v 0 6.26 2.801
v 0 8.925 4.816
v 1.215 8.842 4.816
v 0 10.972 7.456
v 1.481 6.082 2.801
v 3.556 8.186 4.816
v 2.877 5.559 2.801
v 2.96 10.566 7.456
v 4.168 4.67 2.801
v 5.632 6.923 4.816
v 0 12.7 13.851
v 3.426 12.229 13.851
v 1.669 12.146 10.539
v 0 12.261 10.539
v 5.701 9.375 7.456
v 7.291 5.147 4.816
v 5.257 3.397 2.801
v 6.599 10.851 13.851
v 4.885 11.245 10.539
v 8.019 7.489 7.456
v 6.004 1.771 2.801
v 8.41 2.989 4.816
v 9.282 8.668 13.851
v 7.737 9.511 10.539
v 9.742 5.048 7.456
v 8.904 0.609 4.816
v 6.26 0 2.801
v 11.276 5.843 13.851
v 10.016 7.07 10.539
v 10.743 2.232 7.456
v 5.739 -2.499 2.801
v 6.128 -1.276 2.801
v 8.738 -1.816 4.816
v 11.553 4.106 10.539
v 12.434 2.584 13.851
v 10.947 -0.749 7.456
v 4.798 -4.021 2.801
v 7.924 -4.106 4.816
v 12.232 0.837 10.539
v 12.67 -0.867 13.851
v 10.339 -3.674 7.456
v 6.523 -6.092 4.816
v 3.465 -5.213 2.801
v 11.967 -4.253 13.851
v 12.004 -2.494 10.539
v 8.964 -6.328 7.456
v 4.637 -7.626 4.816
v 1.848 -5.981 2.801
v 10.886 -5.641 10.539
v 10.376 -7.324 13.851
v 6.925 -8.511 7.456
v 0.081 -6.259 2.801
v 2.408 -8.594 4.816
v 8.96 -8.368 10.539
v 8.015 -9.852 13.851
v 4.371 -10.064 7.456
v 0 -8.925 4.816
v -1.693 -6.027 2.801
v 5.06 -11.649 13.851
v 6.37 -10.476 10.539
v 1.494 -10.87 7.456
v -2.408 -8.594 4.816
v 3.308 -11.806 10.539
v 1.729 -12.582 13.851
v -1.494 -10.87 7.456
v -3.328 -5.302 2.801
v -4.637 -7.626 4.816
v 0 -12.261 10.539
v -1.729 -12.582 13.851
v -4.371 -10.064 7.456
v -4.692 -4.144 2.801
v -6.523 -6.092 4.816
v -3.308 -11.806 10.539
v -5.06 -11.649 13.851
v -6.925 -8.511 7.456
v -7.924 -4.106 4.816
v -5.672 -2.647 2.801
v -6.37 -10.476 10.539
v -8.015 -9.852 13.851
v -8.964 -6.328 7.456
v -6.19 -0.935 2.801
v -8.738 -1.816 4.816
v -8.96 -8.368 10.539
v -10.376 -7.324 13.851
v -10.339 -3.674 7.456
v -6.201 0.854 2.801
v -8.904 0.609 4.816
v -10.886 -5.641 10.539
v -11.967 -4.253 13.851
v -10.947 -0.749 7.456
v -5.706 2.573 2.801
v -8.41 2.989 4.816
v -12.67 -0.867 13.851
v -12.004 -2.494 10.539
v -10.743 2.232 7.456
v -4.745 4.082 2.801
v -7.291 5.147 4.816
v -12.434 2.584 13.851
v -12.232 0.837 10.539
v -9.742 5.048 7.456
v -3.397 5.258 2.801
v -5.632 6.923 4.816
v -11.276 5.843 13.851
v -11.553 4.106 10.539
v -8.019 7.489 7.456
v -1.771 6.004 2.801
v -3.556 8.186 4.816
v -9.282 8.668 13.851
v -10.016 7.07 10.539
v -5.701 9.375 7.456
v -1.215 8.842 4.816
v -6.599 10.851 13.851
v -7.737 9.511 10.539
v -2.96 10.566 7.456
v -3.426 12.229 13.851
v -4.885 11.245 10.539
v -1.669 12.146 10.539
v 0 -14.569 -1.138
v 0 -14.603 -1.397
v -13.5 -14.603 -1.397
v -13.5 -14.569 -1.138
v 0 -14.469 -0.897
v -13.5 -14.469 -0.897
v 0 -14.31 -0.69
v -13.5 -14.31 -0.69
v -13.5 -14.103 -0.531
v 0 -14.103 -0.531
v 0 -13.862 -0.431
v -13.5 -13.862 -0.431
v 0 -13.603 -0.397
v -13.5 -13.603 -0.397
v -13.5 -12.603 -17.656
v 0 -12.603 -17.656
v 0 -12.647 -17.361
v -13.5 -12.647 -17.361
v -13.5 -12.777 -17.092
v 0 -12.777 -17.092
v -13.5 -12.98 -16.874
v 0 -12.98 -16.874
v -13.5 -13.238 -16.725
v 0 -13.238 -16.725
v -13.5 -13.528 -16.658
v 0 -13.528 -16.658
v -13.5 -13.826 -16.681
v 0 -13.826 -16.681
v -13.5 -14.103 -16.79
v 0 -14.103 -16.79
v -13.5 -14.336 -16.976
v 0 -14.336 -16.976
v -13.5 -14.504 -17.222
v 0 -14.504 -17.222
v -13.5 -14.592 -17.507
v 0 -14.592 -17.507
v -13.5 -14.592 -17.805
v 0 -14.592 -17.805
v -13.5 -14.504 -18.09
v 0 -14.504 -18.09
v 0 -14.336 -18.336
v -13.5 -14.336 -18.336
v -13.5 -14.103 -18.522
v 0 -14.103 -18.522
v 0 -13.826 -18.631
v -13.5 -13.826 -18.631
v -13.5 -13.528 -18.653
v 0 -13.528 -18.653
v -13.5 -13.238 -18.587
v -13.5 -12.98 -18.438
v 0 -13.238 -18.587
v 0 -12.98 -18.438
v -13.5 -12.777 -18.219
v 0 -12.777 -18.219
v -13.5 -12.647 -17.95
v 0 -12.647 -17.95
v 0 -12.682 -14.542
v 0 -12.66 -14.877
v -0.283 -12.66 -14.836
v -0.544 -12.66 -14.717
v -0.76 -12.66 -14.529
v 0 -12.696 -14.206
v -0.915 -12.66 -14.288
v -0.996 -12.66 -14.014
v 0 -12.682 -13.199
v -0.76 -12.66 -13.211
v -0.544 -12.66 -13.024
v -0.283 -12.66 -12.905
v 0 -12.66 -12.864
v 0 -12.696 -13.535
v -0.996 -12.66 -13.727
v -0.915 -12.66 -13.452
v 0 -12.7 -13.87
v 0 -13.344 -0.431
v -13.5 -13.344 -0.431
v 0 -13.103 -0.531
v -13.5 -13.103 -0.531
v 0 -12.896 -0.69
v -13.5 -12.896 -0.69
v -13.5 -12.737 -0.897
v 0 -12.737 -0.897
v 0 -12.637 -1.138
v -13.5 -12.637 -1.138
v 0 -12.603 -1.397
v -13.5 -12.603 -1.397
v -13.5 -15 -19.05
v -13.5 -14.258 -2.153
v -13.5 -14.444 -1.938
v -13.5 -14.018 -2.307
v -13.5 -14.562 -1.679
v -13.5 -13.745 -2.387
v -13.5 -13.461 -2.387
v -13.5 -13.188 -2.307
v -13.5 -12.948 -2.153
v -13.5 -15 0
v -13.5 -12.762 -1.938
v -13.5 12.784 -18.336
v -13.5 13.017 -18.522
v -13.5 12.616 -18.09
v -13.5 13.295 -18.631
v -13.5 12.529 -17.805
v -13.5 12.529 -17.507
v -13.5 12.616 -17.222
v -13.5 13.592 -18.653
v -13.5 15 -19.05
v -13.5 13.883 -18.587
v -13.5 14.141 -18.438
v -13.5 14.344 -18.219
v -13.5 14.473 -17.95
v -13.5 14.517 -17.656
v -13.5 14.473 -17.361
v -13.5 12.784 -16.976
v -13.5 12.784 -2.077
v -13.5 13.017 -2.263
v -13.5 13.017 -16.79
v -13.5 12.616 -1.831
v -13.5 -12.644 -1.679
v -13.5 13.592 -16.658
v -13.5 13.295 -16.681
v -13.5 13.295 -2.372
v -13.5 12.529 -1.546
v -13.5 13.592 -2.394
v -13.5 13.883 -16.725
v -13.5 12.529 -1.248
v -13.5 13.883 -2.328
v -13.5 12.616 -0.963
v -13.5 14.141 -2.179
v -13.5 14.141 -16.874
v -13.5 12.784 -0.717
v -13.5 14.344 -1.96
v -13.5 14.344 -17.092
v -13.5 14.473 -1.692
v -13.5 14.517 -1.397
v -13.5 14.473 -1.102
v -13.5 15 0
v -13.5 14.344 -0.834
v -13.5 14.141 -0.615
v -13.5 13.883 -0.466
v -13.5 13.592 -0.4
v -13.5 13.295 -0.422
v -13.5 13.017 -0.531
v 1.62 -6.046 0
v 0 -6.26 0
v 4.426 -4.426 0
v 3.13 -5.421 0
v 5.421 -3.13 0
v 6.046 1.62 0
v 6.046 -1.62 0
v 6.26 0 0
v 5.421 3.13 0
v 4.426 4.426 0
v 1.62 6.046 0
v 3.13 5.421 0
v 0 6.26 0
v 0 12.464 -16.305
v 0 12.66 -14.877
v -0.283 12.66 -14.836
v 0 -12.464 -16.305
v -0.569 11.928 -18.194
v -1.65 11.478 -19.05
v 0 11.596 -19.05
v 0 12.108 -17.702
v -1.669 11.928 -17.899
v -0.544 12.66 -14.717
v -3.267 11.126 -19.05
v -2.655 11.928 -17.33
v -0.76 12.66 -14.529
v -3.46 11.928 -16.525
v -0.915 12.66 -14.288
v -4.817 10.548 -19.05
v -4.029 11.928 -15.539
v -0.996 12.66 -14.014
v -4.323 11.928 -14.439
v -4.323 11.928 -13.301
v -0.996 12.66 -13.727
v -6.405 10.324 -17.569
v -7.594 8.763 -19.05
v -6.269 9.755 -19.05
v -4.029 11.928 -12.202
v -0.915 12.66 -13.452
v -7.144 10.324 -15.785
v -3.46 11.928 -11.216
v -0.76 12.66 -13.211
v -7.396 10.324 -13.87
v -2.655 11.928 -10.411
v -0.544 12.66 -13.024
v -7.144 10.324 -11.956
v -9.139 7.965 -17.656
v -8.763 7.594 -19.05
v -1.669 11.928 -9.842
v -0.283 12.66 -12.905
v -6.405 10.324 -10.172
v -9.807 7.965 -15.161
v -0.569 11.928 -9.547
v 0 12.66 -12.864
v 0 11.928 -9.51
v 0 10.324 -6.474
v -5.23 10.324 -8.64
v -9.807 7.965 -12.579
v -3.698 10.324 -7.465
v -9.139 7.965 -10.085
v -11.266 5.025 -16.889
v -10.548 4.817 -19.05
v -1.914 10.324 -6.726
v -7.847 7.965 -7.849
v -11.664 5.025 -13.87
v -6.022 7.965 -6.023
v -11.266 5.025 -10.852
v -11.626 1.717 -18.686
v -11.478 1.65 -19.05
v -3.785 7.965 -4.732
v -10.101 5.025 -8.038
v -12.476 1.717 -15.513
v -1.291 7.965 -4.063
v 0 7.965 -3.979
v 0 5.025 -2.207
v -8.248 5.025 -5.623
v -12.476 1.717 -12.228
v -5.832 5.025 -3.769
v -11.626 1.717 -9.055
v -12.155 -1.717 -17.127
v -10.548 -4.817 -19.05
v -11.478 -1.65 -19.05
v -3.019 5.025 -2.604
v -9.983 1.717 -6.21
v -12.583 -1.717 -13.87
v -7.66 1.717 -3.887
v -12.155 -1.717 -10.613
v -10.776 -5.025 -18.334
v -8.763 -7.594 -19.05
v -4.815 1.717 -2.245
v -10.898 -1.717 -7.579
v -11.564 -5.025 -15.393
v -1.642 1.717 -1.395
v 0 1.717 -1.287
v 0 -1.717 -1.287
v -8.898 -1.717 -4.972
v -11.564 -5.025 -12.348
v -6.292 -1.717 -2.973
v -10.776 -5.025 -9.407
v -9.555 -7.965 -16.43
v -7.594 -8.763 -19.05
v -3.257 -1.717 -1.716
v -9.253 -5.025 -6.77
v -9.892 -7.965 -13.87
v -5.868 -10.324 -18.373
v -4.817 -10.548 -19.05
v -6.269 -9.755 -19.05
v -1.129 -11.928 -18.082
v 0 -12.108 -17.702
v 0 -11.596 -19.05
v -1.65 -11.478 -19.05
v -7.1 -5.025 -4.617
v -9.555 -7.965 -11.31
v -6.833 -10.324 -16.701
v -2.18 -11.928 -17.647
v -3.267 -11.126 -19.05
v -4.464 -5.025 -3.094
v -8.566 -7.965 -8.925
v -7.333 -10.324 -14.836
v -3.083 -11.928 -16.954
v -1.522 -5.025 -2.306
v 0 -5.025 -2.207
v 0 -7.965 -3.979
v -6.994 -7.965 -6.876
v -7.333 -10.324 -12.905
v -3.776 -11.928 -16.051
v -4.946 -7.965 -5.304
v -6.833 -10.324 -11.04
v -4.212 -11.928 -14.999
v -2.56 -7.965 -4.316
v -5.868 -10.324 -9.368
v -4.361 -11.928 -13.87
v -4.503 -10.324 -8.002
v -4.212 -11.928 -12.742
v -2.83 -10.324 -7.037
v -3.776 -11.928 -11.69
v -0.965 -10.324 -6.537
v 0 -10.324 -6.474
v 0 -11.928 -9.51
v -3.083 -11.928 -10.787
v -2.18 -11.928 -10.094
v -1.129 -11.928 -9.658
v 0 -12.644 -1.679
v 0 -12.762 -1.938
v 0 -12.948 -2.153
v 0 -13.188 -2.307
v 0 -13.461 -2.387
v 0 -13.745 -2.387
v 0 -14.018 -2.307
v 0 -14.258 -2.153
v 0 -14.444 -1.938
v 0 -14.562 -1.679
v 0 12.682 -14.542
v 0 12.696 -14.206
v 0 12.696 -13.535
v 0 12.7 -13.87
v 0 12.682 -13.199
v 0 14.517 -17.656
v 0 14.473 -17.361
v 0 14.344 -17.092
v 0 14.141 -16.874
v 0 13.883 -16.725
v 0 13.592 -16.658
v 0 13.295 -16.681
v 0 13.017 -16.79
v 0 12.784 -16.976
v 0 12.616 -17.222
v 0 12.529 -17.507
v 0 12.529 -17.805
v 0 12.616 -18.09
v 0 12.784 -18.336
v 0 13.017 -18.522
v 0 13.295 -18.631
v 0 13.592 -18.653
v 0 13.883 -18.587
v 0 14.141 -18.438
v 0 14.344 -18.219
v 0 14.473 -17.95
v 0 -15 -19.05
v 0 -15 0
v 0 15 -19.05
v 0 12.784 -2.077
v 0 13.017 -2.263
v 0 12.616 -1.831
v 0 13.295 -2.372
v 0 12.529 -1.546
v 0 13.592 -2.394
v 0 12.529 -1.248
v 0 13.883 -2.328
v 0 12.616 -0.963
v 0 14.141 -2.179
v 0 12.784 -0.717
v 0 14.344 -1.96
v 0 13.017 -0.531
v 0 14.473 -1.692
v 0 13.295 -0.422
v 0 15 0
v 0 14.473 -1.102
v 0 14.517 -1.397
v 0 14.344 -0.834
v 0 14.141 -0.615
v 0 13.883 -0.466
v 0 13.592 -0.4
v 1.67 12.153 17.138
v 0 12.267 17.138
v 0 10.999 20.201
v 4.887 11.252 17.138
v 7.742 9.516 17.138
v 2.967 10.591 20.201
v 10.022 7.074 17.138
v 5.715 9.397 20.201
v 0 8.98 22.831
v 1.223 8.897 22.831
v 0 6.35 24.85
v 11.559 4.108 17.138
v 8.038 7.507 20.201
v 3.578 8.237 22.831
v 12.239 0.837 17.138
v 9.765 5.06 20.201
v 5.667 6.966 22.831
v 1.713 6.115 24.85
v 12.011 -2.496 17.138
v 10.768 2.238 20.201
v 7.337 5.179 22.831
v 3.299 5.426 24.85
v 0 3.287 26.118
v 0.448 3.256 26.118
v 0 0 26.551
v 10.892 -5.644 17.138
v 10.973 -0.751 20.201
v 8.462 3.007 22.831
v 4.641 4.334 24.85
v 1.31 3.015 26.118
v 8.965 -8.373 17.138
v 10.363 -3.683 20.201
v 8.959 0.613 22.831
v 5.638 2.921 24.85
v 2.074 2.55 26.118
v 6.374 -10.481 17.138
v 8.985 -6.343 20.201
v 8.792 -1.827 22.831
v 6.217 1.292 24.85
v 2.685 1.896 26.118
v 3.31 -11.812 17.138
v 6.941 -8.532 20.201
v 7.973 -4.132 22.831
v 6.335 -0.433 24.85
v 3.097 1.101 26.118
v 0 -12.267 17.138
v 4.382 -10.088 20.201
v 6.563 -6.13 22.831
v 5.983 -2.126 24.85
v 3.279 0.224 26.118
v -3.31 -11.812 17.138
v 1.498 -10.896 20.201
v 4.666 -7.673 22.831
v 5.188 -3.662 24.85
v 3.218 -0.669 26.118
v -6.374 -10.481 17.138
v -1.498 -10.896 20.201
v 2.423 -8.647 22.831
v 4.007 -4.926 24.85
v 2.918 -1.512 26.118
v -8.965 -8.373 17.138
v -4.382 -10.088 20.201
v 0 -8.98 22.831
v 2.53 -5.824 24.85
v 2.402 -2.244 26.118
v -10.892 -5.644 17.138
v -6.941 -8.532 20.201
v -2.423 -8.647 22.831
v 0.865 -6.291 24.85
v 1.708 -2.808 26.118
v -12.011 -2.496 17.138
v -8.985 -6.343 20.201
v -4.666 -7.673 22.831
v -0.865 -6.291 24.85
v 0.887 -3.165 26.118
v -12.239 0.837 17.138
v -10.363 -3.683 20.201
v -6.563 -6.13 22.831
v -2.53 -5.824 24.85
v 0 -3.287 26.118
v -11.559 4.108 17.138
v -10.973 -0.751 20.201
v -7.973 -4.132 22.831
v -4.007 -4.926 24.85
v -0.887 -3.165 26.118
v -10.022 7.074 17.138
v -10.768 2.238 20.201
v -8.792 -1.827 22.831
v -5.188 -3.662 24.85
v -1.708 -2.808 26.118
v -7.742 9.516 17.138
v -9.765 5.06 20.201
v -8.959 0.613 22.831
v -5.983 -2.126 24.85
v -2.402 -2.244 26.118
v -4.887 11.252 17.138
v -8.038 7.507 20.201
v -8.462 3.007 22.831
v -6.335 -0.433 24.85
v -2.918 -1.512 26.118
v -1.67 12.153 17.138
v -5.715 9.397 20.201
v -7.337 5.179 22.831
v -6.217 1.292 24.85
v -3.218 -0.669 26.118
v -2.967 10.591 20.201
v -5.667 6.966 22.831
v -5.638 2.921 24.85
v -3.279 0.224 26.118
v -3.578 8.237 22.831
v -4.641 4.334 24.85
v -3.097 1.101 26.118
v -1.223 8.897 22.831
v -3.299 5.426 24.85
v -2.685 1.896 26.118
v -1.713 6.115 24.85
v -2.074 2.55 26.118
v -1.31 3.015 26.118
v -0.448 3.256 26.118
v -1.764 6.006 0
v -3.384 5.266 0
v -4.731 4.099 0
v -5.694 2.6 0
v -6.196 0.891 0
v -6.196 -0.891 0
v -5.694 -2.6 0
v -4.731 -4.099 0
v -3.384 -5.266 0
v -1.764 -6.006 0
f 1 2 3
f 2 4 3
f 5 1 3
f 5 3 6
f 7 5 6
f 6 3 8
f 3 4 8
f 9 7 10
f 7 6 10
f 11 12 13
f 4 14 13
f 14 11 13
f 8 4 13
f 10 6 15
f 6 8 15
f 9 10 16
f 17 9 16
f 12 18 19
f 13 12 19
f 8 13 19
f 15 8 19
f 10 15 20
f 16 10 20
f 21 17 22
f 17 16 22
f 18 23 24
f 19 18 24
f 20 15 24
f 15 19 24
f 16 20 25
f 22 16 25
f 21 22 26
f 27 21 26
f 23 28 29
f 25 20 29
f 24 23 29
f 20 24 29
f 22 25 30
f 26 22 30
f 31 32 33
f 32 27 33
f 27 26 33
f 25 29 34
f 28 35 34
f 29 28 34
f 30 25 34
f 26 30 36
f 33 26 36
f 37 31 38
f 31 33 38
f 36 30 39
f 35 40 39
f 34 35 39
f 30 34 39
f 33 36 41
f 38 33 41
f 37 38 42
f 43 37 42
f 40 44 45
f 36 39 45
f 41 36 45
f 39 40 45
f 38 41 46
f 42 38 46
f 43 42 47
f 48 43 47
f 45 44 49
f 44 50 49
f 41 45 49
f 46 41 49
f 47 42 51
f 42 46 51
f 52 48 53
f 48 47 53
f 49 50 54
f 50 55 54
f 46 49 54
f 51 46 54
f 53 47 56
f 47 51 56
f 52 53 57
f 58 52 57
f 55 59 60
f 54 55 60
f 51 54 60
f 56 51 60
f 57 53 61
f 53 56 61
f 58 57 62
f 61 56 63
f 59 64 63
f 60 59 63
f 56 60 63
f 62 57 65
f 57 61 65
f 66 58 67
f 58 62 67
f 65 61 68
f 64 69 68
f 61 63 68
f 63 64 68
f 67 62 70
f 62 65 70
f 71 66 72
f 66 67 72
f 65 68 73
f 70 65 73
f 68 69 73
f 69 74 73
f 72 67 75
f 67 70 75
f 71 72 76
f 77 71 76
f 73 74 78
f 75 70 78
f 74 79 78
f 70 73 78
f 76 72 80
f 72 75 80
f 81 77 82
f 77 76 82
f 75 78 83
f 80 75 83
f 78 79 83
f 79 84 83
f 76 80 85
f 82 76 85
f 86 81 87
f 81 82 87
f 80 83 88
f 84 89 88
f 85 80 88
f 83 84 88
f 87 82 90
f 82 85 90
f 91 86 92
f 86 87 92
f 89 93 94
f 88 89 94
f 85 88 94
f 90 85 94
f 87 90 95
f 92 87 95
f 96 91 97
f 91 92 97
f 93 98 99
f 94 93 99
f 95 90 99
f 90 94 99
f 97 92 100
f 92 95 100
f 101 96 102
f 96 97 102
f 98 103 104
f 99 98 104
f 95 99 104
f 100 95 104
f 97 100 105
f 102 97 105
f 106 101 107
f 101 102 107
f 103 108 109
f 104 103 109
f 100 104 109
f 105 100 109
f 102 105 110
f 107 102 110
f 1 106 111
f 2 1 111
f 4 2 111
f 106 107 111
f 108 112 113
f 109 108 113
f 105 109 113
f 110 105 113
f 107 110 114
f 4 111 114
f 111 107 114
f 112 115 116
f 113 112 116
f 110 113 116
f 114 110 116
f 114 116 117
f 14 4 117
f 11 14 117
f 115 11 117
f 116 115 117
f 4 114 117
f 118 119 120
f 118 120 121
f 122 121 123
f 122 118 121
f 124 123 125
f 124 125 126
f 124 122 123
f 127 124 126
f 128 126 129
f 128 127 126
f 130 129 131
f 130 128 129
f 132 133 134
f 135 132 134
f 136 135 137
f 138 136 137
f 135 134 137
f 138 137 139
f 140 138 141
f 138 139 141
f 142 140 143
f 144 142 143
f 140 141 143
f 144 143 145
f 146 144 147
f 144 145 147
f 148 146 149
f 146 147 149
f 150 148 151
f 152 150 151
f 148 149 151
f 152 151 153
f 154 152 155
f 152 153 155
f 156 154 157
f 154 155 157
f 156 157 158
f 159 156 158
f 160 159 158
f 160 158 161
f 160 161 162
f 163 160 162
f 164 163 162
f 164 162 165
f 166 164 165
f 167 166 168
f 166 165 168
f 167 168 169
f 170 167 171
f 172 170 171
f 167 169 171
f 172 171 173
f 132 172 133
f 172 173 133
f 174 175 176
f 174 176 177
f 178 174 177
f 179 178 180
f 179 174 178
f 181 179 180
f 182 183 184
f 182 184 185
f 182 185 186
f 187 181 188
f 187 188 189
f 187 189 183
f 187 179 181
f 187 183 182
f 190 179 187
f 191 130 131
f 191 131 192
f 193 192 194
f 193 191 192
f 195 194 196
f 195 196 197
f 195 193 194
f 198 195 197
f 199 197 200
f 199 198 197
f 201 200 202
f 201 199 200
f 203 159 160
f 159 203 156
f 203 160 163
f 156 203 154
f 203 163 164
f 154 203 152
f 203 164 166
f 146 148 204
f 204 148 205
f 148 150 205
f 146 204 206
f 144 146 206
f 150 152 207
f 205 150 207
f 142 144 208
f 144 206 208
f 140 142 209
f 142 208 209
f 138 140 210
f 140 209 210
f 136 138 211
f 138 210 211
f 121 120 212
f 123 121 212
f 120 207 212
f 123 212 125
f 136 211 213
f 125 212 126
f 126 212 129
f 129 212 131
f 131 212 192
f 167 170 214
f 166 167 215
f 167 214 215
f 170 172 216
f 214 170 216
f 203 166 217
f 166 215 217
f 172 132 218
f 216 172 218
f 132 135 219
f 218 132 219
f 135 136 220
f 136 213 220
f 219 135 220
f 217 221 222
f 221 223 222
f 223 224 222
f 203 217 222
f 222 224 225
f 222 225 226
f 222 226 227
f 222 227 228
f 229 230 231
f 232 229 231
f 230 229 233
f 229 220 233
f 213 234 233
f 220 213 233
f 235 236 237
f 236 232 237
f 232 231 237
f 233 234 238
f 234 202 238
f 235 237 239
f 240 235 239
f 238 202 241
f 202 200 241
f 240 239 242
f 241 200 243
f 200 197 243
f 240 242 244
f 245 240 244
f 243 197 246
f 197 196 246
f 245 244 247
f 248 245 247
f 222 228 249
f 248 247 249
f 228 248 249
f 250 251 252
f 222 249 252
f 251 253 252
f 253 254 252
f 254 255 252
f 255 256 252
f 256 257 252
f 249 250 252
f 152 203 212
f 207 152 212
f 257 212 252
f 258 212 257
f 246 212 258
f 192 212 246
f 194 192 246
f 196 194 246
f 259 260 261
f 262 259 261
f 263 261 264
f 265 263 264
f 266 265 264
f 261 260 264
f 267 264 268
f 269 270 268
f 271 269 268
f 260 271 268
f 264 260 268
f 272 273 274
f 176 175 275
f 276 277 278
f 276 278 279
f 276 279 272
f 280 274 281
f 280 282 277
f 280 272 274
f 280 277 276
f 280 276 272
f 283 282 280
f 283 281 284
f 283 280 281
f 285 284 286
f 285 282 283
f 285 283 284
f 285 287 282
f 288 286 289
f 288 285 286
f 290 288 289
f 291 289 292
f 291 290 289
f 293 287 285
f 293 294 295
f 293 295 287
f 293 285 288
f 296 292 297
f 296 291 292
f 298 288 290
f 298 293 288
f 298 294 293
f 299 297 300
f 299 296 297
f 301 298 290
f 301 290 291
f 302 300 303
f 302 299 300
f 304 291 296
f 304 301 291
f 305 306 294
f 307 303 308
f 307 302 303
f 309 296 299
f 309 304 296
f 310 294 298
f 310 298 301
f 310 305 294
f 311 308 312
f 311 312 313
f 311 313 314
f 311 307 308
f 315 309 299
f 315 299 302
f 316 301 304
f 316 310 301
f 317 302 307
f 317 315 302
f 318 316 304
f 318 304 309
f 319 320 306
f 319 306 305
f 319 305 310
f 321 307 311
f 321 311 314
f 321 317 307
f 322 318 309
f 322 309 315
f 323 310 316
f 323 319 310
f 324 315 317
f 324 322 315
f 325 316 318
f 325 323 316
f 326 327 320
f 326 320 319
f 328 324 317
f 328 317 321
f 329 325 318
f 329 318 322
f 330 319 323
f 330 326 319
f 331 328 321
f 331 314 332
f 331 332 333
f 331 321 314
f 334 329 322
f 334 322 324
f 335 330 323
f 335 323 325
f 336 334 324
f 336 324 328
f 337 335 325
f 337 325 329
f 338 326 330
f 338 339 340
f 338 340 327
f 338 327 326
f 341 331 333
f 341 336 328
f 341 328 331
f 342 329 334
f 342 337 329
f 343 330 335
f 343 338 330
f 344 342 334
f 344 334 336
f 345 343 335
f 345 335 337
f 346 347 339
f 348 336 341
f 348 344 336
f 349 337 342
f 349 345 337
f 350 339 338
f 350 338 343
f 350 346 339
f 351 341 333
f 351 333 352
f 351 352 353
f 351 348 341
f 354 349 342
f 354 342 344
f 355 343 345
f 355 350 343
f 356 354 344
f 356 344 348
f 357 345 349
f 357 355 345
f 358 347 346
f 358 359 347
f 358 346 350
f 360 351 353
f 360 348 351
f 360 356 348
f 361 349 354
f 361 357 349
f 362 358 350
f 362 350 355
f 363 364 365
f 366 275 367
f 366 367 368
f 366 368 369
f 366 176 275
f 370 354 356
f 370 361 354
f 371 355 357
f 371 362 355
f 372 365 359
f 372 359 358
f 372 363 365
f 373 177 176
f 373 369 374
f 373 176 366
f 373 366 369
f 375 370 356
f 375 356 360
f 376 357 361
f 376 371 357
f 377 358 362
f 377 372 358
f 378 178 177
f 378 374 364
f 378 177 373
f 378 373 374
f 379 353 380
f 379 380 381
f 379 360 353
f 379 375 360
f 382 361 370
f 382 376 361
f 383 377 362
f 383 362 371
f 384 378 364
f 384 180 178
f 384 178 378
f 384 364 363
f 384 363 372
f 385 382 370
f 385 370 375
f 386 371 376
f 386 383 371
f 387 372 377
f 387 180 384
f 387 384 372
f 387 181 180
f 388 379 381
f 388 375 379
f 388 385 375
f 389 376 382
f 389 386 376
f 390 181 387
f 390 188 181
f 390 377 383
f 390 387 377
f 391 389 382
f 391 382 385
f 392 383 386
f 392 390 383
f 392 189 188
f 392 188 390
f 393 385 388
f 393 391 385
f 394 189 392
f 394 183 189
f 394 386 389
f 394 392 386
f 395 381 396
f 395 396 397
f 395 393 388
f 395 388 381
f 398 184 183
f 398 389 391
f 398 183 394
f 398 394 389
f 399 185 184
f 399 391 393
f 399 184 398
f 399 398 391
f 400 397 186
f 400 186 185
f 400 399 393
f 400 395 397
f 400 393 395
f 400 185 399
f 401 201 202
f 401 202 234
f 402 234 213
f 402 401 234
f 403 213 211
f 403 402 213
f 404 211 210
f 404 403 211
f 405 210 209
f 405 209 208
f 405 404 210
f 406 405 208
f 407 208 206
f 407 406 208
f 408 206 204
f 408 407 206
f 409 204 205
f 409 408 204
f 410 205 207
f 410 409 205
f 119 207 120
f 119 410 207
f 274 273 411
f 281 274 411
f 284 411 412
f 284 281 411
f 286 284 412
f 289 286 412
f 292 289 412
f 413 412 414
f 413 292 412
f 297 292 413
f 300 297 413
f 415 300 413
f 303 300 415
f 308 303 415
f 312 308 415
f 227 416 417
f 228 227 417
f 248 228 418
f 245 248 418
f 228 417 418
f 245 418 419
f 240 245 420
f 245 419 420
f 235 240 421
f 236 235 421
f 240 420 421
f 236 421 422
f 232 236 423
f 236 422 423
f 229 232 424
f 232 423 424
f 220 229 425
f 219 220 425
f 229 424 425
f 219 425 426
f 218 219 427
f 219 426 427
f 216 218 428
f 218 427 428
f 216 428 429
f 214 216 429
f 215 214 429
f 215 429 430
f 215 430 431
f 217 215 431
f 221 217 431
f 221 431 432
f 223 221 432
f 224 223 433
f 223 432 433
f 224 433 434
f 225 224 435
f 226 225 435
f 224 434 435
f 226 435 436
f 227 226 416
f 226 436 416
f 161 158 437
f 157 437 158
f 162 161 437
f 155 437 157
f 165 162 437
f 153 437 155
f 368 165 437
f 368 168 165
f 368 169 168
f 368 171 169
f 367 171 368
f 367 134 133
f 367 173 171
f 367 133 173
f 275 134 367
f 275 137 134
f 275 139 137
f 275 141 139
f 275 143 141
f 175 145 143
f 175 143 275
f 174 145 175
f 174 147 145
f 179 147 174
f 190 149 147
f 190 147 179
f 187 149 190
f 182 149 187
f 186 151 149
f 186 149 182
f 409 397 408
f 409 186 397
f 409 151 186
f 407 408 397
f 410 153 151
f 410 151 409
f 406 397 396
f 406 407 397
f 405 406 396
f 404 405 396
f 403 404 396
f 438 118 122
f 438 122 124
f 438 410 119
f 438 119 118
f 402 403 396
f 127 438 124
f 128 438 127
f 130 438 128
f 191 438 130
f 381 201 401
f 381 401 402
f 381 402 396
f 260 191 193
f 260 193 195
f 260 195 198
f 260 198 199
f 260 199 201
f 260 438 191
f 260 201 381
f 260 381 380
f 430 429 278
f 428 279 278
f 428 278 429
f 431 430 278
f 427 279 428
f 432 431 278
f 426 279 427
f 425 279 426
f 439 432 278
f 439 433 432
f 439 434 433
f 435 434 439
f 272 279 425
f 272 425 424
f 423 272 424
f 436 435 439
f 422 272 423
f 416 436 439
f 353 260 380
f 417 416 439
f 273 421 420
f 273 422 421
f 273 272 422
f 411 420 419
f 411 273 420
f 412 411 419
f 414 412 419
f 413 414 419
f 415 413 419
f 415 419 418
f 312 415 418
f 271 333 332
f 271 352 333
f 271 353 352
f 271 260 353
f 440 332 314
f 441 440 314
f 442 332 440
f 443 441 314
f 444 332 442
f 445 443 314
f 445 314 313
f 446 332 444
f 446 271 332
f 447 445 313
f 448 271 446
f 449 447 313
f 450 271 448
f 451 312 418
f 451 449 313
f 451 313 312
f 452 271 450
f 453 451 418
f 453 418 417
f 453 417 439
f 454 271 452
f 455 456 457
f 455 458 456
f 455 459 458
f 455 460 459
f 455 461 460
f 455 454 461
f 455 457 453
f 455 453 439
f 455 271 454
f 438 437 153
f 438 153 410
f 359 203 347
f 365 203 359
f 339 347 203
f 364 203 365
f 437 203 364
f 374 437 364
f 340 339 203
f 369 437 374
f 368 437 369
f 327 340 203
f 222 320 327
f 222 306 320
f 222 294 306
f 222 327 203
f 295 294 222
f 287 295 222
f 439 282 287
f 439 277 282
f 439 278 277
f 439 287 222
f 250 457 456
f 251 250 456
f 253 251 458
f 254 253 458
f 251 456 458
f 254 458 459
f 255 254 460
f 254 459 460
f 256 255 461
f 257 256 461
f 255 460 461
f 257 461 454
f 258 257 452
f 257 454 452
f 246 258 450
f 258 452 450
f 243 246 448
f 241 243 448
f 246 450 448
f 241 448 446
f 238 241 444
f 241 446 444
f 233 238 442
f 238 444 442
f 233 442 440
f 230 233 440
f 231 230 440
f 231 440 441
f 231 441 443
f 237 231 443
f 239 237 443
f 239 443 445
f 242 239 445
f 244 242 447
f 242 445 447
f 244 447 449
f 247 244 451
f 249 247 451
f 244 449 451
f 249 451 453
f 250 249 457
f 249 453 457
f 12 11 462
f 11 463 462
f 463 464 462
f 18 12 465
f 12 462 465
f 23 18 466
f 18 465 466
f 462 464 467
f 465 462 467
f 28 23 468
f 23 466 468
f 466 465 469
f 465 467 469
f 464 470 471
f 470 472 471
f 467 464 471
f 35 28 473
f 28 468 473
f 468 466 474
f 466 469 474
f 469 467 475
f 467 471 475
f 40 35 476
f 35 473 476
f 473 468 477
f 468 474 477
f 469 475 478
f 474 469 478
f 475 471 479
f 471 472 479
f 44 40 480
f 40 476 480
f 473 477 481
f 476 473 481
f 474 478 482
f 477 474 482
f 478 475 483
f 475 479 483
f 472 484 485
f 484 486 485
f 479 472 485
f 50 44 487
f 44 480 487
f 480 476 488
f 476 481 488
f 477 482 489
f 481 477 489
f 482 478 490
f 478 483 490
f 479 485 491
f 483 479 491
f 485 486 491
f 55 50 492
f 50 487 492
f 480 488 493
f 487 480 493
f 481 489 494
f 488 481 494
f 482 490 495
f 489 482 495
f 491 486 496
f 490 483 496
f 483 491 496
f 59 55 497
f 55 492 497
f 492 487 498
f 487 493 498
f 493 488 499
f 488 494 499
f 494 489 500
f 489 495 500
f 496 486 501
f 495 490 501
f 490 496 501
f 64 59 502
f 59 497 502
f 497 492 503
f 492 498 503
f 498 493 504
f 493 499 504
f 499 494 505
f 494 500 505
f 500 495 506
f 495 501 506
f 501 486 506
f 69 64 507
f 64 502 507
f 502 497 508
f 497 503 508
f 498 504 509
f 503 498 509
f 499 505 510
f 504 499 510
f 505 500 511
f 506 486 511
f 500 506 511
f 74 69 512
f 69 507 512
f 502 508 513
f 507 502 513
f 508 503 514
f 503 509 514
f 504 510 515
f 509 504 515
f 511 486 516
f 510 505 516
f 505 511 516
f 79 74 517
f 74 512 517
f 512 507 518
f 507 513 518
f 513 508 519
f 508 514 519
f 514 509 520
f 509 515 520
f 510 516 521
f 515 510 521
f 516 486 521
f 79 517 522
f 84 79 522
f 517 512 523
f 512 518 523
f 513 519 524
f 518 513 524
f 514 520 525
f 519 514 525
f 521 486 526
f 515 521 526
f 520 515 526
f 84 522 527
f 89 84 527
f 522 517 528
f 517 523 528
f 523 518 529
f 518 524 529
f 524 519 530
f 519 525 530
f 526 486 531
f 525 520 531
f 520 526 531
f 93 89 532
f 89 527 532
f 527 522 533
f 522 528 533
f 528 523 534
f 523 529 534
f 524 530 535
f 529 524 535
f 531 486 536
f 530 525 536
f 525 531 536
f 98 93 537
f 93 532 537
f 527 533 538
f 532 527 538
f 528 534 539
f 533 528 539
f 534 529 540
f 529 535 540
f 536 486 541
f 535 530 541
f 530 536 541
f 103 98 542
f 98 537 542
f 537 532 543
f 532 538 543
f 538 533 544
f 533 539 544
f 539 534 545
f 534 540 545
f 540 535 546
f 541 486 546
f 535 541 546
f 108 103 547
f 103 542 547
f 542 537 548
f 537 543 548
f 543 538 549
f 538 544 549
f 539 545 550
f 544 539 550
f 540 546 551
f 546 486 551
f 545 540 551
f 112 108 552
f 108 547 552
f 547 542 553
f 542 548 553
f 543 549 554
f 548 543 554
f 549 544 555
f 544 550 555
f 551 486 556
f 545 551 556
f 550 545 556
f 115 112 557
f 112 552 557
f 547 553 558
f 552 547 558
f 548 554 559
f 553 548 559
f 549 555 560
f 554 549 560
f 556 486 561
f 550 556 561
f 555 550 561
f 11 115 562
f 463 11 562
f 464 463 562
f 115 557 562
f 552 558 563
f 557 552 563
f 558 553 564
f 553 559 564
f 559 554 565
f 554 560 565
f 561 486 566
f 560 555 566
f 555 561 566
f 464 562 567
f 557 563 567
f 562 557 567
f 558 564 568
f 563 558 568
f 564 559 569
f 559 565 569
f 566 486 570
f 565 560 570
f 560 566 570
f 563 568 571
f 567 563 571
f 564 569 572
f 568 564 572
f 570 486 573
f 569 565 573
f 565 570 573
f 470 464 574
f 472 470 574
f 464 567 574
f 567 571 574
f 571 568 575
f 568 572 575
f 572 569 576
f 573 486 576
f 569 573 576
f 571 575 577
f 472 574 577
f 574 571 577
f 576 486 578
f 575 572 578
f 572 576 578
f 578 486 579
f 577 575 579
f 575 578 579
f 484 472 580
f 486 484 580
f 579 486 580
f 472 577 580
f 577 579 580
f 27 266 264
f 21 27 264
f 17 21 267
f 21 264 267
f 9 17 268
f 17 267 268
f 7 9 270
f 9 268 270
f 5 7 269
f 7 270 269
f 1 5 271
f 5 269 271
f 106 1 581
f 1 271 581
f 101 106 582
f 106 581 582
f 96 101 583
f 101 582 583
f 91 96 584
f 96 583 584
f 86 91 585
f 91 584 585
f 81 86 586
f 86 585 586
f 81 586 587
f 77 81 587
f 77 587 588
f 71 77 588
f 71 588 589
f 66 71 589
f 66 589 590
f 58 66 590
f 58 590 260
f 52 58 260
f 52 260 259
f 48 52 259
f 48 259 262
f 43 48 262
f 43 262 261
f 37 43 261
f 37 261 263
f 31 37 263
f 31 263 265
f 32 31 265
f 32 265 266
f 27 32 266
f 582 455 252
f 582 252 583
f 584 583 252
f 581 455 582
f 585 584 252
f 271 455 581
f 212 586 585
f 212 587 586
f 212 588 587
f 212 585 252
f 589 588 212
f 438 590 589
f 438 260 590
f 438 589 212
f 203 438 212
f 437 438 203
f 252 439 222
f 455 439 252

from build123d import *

# Parameters (mm, degrees)
F2_R     = 6.2596868845
F3_DEPTH = 3.048
F4_R     = 1
F5_DEPTH = 13.5


with BuildPart() as f1:
    # F0 (on Right) → F1 (revolve)
    with BuildSketch(Plane.YZ):
        with BuildLine():
            ThreePointArc((0, 1.1509964916), (8.9802561211, 4.8707403706), (12.7, 13.8509964916))
            ThreePointArc((12.7, 13.8509964916), (8.9802561211, 22.8312526127), (0, 26.5509964916))
            Line((0, 26.5509964916), (0, 1.1509964916))
        make_face()
    revolve(axis=Axis((0, 0, 13.8509964916), (0, 0, -1)))

    # F2 (on Top) → F3 (join)
    with BuildSketch(Plane.XY):
        Circle(F2_R)
    extrude(amount=F3_DEPTH)

    # F4 (on Right) → F5 (join)
    with BuildSketch(Plane.YZ):
        with BuildLine():
            Line((-13.603, 0), (-15, 0))
            Line((-15, 0), (-15, -1.397))
            Line((-15, -1.397), (-14.603, -1.397))
            ThreePointArc((-14.603, -1.397), (-14.3101067812, -0.6898932188), (-13.603, -0.397))
            Line((-13.603, -0.397), (-13.603, 0))
        make_face()
        with BuildLine():
            Line((15, 0), (-13.603, 0))
            Line((-13.603, 0), (-13.603, -0.397))
            ThreePointArc((-13.603, -0.397), (-12.8958932188, -0.6898932188), (-12.603, -1.397))
            ThreePointArc((-12.603, -1.397), (-13.603, -2.397), (-14.603, -1.397))
            Line((-14.603, -1.397), (-15, -1.397))
            Line((-15, -1.397), (-15, -12.8640756011))
            Line((-15, -12.8640756011), (-12.6600748075, -12.8640756011))
            ThreePointArc((-12.6600748075, -12.8640756011), (0, -1.170309107), (12.6600748075, -12.8640756011))
            Line((12.6600748075, -12.8640756011), (15, -12.8640756011))
            Line((15, -12.8640756011), (15, 0))
        make_face()
        with Locations((13.5173769371, -1.397)):
            Circle(F4_R, mode=Mode.SUBTRACT)
        with BuildLine():
            Line((-12.6600748075, -12.8640756011), (-15, -12.8640756011))
            Line((-15, -12.8640756011), (-15, -19.05))
            Line((-15, -19.05), (-11.5957234467, -19.05))
            ThreePointArc((-11.5957234467, -19.05), (-12.4208632505, -16.518356711), (-12.7, -13.870309107))
            ThreePointArc((-12.7, -13.870309107), (-12.6900147765, -13.3667964733), (-12.6600748075, -12.8640756011))
        make_face()
        with Locations((-13.603, -17.6556983136)):
            Circle(F4_R, mode=Mode.SUBTRACT)
        with BuildLine():
            Line((15, -19.05), (15, -12.8640756011))
            Line((15, -12.8640756011), (12.6600748075, -12.8640756011))
            ThreePointArc((12.6600748075, -12.8640756011), (12.6900147765, -13.3667964733), (12.7, -13.870309107))
            ThreePointArc((12.7, -13.870309107), (12.4208632505, -16.518356711), (11.5957234467, -19.05))
            Line((11.5957234467, -19.05), (15, -19.05))
        make_face()
        with Locations((13.5173769371, -17.6556983136)):
            Circle(F4_R, mode=Mode.SUBTRACT)
        with BuildLine():
            ThreePointArc((-12.7, -13.870309107), (-12.4208632505, -16.518356711), (-11.5957234467, -19.05))
            Line((-11.5957234467, -19.05), (0, -19.05))
            Line((0, -19.05), (0, -13.870309107))
            Line((0, -13.870309107), (-12.7, -13.870309107))
        make_face()
        with BuildLine():
            Line((0, -19.05), (11.5957234467, -19.05))
            ThreePointArc((11.5957234467, -19.05), (12.4208632505, -16.518356711), (12.7, -13.870309107))
            Line((12.7, -13.870309107), (0, -13.870309107))
            Line((0, -13.870309107), (0, -19.05))
        make_face()
        with BuildLine():
            ThreePointArc((12.6600748075, -12.8640756011), (0, -1.170309107), (-12.6600748075, -12.8640756011))
            ThreePointArc((-12.6600748075, -12.8640756011), (-12.6900147765, -13.3667964733), (-12.7, -13.870309107))
            Line((-12.7, -13.870309107), (0, -13.870309107))
            Line((0, -13.870309107), (12.7, -13.870309107))
            ThreePointArc((12.7, -13.870309107), (12.6900147765, -13.3667964733), (12.6600748075, -12.8640756011))
        make_face()
    extrude(amount=-F5_DEPTH)

    # F4 (on Right) → F6 (revolve, cut)
    with BuildSketch(Plane.YZ):
        with BuildLine():
            ThreePointArc((12.6600748075, -12.8640756011), (0, -1.170309107), (-12.6600748075, -12.8640756011))
            ThreePointArc((-12.6600748075, -12.8640756011), (-12.6900147765, -13.3667964733), (-12.7, -13.870309107))
            Line((-12.7, -13.870309107), (0, -13.870309107))
            Line((0, -13.870309107), (12.7, -13.870309107))
            ThreePointArc((12.7, -13.870309107), (12.6900147765, -13.3667964733), (12.6600748075, -12.8640756011))
        make_face()
    revolve(axis=Axis((0, 0, -13.870309107), (0, 1, 0)), mode=Mode.SUBTRACT)


solid = f1.part
